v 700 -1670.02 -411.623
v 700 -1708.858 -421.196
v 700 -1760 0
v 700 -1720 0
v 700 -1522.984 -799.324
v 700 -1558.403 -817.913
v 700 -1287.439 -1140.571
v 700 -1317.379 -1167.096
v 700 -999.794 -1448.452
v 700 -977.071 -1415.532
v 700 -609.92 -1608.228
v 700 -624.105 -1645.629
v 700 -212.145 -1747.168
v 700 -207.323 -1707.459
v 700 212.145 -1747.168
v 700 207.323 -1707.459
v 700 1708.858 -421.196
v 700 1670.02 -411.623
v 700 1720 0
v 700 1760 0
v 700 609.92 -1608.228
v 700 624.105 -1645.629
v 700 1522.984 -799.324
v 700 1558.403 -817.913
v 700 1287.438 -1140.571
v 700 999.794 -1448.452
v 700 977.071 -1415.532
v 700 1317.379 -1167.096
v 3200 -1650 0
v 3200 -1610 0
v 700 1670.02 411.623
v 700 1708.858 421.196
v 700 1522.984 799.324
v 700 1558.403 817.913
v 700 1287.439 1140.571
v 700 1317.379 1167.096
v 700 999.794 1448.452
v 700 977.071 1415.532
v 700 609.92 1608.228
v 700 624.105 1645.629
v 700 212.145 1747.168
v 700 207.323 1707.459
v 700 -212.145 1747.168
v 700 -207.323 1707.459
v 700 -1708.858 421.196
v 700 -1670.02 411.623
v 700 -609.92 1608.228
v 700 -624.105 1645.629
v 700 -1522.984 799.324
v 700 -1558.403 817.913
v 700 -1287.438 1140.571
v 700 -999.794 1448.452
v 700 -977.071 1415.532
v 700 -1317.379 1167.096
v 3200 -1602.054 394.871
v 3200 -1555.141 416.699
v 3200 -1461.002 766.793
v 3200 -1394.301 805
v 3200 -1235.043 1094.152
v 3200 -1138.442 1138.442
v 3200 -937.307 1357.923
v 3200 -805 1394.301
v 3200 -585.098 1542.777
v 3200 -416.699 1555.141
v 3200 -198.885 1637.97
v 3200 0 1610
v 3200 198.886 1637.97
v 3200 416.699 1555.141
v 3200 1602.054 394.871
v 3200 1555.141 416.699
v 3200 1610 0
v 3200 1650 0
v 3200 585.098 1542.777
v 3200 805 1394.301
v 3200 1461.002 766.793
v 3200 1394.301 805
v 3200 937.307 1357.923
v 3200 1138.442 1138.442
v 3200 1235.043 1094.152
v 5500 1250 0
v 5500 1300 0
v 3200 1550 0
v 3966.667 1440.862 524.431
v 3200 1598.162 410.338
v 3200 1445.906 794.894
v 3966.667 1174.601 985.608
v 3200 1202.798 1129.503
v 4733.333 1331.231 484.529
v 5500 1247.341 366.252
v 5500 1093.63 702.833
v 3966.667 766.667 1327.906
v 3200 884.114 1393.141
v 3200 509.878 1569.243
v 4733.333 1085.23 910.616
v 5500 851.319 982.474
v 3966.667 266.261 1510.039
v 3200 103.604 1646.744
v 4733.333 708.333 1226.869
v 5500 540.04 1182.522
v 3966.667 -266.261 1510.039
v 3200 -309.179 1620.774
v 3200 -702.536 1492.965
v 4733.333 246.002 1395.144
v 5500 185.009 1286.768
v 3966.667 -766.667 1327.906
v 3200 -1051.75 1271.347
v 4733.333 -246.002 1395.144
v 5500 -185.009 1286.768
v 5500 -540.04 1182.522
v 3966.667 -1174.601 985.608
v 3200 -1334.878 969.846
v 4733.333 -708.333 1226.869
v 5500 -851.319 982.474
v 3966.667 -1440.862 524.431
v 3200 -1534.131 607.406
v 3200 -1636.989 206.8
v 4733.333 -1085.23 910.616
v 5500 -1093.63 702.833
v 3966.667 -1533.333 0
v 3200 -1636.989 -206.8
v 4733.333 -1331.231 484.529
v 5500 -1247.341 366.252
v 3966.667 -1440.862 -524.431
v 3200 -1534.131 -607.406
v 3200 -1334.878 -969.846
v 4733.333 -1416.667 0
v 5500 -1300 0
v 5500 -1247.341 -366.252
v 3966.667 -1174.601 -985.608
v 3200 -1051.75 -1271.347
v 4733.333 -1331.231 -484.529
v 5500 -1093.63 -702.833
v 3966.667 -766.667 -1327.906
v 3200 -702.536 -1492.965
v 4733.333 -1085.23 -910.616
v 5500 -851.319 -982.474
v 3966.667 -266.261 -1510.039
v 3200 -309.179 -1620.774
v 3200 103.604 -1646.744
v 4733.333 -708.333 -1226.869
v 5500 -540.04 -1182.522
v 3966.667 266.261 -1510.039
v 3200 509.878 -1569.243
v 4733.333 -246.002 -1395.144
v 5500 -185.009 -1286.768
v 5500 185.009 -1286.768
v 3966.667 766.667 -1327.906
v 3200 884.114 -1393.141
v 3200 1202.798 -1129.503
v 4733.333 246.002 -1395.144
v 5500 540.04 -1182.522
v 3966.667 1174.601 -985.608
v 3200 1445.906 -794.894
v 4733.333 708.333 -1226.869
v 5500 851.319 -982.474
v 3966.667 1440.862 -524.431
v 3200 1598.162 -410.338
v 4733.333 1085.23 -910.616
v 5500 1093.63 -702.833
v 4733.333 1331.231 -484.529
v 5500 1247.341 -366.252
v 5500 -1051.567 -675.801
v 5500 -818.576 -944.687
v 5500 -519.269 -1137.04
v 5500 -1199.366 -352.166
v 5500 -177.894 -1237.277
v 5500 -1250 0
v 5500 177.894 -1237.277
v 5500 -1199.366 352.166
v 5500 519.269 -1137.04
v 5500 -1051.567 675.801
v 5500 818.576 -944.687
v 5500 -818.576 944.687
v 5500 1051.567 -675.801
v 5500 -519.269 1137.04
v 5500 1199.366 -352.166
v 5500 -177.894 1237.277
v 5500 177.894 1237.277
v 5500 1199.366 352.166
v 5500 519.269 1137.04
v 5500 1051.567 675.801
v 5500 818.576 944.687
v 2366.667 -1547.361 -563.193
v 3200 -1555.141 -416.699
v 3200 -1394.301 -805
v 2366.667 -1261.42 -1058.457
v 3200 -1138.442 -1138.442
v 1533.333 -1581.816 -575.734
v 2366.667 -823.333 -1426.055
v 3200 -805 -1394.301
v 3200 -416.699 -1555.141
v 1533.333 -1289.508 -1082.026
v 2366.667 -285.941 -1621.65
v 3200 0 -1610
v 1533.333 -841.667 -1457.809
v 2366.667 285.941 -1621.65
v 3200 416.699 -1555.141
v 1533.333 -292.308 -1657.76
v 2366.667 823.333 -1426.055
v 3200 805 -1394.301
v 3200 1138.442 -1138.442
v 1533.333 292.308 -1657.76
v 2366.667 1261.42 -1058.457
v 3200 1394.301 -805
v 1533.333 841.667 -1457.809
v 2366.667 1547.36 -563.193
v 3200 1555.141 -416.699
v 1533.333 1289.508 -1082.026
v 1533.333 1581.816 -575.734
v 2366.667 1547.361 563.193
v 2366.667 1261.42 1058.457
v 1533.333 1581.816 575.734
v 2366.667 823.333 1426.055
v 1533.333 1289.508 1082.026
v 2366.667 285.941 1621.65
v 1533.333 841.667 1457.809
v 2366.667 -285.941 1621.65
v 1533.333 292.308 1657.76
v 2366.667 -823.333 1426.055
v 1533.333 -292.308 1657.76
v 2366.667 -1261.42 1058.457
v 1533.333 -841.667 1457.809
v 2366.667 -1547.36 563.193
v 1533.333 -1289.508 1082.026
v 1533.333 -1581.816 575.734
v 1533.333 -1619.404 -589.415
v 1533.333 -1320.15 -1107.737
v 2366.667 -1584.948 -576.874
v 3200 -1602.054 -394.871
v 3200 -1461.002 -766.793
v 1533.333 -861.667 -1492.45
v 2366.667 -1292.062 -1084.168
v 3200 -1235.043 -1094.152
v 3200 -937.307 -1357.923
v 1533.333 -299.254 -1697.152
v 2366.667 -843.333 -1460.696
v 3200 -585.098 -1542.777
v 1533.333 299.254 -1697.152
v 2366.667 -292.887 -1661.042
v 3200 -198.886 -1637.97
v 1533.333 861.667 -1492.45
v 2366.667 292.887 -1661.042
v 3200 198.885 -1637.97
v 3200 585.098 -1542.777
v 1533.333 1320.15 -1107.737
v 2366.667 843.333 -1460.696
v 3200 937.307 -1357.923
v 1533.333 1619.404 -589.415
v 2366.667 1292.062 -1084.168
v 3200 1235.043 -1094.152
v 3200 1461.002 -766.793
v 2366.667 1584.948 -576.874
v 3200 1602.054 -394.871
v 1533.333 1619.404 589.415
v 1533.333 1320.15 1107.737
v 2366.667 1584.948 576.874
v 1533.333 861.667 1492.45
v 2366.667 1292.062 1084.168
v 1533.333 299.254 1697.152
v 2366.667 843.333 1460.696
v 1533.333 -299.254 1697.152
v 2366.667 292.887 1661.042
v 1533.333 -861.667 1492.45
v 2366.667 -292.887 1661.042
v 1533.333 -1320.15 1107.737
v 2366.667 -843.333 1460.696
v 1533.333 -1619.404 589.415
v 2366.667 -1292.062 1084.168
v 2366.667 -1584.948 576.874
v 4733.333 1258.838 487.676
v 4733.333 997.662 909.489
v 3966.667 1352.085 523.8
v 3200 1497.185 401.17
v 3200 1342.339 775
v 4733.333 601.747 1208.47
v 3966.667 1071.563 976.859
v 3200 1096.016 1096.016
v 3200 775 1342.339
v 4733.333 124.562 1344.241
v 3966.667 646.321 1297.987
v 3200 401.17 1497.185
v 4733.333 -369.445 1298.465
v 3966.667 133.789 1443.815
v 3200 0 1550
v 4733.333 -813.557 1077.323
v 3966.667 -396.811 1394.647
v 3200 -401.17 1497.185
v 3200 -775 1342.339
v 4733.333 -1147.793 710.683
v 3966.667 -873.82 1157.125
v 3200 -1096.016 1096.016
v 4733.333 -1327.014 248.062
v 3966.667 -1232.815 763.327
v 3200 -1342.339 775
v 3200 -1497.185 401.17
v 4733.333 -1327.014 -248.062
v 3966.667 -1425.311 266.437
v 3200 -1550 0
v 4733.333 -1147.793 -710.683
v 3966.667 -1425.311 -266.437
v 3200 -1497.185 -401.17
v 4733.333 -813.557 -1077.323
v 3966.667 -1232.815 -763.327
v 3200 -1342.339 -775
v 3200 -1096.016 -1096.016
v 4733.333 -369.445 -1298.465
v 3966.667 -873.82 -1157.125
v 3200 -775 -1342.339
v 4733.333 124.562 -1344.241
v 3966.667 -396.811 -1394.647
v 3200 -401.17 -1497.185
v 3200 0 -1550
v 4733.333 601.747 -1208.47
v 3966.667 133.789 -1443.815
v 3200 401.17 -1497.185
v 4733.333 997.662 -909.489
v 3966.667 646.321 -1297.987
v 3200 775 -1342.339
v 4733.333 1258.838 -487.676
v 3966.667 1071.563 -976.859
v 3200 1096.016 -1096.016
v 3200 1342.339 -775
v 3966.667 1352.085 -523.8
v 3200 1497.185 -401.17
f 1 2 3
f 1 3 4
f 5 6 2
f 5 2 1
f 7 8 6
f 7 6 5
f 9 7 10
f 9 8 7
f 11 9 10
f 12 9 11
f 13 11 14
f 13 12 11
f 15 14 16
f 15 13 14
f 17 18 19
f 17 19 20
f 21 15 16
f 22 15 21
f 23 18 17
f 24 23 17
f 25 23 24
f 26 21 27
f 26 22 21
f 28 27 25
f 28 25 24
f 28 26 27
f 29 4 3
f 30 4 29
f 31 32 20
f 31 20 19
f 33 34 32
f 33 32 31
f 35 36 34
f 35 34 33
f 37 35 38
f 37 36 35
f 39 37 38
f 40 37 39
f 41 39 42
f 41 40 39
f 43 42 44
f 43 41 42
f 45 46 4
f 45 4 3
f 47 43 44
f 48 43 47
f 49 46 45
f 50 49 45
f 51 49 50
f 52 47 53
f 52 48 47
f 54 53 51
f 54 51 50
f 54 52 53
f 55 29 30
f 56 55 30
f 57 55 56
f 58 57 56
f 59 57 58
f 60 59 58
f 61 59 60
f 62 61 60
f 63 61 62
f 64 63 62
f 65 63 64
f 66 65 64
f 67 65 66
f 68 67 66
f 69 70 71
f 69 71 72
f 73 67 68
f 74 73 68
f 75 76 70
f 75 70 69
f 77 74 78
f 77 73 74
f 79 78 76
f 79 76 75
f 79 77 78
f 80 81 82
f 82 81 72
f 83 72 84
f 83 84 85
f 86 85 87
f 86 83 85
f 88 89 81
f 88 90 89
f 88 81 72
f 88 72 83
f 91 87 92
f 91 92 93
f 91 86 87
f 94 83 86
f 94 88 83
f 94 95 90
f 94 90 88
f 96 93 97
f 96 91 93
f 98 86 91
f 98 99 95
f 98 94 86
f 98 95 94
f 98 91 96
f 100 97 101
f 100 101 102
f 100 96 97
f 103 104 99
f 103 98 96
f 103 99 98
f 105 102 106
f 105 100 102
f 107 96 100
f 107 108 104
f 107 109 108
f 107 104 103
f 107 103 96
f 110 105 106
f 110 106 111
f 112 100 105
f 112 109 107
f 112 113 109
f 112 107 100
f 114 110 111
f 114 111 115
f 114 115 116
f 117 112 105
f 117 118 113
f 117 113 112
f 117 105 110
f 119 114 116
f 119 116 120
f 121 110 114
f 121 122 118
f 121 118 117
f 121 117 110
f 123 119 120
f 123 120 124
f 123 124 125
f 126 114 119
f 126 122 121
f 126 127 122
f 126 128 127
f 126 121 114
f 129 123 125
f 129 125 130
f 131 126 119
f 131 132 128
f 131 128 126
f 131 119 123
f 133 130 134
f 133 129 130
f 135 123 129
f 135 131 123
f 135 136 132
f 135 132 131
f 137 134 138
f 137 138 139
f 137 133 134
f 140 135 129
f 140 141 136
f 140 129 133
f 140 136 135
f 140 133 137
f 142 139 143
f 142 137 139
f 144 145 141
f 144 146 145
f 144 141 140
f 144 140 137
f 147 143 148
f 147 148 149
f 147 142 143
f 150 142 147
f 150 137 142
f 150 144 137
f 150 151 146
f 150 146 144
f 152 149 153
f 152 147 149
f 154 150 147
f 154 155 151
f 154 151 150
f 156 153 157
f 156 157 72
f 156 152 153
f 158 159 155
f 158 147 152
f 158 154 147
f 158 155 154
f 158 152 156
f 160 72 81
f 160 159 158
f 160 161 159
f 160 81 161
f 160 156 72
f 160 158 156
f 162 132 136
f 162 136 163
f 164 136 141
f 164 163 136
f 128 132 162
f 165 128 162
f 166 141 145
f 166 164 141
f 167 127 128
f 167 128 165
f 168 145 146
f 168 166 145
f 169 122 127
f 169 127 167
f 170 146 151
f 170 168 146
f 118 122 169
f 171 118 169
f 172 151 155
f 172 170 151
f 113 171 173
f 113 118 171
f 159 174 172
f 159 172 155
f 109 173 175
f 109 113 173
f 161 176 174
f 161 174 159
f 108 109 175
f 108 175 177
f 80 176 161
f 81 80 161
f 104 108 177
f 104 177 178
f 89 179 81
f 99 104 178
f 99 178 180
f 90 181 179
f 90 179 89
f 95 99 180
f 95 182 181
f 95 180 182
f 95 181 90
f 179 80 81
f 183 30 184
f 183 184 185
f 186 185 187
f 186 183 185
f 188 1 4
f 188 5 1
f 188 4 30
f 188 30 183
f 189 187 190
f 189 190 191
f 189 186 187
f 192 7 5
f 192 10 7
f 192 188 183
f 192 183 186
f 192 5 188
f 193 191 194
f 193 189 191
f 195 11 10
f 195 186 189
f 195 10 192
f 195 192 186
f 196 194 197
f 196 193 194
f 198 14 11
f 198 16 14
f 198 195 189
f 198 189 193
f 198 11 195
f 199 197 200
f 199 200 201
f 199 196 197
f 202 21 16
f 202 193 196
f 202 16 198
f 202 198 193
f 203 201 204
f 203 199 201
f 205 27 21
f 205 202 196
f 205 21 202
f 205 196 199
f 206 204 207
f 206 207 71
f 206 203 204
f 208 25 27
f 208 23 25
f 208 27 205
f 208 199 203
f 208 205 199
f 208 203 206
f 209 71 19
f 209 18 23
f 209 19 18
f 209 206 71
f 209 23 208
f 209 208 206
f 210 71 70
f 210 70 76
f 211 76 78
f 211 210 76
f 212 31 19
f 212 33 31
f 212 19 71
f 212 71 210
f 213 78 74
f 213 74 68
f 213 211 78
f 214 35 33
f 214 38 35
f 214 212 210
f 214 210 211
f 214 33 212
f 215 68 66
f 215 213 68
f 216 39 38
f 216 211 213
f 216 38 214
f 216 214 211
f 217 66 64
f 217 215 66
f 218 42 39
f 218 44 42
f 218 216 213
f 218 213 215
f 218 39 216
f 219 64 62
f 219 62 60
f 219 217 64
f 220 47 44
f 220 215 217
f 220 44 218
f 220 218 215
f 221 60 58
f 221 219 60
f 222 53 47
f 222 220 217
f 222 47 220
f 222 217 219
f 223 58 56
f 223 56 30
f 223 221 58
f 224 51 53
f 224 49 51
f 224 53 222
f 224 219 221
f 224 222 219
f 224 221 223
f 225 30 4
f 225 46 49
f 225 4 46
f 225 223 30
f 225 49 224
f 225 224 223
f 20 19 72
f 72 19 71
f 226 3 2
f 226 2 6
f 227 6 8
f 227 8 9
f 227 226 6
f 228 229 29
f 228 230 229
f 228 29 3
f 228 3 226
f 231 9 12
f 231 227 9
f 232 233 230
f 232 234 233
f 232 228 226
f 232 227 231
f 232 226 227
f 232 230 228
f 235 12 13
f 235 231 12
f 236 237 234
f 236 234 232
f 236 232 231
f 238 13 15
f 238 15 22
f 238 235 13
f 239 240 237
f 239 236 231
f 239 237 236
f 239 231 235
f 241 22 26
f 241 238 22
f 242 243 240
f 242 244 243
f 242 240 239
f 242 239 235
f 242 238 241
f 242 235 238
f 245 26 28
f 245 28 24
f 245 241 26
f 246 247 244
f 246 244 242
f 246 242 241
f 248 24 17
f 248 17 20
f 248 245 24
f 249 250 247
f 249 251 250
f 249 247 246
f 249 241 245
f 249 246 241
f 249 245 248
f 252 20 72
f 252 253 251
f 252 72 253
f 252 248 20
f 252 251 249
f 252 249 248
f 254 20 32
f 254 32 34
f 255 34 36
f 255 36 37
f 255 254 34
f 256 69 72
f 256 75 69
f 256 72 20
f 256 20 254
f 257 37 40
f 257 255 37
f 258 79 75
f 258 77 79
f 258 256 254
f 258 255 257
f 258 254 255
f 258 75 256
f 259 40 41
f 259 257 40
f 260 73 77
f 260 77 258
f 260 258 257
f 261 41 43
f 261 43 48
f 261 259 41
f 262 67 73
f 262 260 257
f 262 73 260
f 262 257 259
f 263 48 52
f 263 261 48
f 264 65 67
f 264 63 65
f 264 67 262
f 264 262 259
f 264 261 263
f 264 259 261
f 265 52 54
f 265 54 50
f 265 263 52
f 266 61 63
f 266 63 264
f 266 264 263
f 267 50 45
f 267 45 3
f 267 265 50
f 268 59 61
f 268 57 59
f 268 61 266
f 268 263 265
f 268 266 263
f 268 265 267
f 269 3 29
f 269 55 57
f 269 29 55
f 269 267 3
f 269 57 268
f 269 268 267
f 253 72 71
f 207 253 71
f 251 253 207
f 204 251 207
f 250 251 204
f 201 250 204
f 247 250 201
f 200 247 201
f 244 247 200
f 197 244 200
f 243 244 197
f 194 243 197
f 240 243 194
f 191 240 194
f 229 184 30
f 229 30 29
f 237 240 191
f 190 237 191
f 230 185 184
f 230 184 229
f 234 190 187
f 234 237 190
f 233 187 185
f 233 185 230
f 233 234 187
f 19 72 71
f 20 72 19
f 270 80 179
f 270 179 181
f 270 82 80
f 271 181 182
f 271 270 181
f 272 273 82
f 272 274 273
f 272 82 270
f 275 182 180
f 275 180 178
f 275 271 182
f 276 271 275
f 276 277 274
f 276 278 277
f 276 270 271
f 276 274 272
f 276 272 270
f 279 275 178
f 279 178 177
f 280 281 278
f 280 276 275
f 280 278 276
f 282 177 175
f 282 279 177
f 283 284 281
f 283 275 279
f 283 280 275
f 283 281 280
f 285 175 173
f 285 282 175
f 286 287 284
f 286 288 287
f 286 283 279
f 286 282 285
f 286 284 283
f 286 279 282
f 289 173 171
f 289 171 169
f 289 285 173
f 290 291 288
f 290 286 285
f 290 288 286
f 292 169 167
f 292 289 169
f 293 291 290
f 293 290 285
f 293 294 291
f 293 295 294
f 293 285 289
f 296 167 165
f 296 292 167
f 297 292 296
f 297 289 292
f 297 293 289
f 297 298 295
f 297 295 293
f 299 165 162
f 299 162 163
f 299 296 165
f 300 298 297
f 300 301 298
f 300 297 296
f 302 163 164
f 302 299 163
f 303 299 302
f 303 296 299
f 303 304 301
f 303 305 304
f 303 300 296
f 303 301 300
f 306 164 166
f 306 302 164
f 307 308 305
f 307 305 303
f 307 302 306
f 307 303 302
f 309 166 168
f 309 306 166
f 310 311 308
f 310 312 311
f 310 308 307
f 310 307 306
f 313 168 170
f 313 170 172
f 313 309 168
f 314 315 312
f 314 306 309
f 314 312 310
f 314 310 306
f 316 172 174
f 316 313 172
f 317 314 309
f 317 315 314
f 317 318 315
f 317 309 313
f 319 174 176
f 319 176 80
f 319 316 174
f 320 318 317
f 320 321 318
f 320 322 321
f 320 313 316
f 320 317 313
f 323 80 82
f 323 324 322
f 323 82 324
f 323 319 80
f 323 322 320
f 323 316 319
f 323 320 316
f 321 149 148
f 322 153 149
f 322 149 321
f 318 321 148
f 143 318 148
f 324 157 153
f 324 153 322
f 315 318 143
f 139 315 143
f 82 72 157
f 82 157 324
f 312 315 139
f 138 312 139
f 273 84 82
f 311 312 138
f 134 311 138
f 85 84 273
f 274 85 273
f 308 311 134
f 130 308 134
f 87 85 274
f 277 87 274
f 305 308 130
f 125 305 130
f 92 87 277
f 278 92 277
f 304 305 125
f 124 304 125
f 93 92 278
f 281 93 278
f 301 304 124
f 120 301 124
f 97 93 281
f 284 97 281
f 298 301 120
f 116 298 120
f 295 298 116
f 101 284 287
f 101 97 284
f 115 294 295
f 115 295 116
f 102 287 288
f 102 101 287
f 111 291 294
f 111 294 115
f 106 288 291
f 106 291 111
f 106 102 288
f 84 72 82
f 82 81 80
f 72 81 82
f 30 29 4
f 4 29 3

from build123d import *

# Parameters (mm, degrees)
REVOLVE1_ANGLE = 179.99999693
REVOLVE2_ANGLE = 179.99999693
REVOLVE3_ANGLE = 359.999999589


with BuildPart() as part:
    # Sketch1 → Revolve1 (revolve)
    with BuildSketch(Plane.XY):
        Polygon((700, 1720), (700, 1760), (3200, 1650), (3200, 1610), align=None)
    revolve(axis=Axis((0, 0, 0), (1, 0, 0)), revolution_arc=REVOLVE1_ANGLE)


with BuildPart() as body_2:
    # Sketch2 → Revolve2 (revolve)
    with BuildSketch(Plane.XY):
        Polygon((700, -1720), (700, -1760), (3200, -1650), (3200, -1610), align=None)
    revolve(axis=Axis((0, 0, 0), (1, 0, 0)), revolution_arc=REVOLVE2_ANGLE)


with BuildPart() as body_3:
    # Sketch3 → Revolve3 (revolve)
    with BuildSketch(Plane.XY):
        Polygon((3200, 1550), (3200, 1650), (5500, 1300), (5500, 1250), align=None)
    revolve(axis=Axis((0, 0, 0), (1, 0, 0)), revolution_arc=REVOLVE3_ANGLE)


solid = Compound([part.part, body_2.part, body_3.part])
